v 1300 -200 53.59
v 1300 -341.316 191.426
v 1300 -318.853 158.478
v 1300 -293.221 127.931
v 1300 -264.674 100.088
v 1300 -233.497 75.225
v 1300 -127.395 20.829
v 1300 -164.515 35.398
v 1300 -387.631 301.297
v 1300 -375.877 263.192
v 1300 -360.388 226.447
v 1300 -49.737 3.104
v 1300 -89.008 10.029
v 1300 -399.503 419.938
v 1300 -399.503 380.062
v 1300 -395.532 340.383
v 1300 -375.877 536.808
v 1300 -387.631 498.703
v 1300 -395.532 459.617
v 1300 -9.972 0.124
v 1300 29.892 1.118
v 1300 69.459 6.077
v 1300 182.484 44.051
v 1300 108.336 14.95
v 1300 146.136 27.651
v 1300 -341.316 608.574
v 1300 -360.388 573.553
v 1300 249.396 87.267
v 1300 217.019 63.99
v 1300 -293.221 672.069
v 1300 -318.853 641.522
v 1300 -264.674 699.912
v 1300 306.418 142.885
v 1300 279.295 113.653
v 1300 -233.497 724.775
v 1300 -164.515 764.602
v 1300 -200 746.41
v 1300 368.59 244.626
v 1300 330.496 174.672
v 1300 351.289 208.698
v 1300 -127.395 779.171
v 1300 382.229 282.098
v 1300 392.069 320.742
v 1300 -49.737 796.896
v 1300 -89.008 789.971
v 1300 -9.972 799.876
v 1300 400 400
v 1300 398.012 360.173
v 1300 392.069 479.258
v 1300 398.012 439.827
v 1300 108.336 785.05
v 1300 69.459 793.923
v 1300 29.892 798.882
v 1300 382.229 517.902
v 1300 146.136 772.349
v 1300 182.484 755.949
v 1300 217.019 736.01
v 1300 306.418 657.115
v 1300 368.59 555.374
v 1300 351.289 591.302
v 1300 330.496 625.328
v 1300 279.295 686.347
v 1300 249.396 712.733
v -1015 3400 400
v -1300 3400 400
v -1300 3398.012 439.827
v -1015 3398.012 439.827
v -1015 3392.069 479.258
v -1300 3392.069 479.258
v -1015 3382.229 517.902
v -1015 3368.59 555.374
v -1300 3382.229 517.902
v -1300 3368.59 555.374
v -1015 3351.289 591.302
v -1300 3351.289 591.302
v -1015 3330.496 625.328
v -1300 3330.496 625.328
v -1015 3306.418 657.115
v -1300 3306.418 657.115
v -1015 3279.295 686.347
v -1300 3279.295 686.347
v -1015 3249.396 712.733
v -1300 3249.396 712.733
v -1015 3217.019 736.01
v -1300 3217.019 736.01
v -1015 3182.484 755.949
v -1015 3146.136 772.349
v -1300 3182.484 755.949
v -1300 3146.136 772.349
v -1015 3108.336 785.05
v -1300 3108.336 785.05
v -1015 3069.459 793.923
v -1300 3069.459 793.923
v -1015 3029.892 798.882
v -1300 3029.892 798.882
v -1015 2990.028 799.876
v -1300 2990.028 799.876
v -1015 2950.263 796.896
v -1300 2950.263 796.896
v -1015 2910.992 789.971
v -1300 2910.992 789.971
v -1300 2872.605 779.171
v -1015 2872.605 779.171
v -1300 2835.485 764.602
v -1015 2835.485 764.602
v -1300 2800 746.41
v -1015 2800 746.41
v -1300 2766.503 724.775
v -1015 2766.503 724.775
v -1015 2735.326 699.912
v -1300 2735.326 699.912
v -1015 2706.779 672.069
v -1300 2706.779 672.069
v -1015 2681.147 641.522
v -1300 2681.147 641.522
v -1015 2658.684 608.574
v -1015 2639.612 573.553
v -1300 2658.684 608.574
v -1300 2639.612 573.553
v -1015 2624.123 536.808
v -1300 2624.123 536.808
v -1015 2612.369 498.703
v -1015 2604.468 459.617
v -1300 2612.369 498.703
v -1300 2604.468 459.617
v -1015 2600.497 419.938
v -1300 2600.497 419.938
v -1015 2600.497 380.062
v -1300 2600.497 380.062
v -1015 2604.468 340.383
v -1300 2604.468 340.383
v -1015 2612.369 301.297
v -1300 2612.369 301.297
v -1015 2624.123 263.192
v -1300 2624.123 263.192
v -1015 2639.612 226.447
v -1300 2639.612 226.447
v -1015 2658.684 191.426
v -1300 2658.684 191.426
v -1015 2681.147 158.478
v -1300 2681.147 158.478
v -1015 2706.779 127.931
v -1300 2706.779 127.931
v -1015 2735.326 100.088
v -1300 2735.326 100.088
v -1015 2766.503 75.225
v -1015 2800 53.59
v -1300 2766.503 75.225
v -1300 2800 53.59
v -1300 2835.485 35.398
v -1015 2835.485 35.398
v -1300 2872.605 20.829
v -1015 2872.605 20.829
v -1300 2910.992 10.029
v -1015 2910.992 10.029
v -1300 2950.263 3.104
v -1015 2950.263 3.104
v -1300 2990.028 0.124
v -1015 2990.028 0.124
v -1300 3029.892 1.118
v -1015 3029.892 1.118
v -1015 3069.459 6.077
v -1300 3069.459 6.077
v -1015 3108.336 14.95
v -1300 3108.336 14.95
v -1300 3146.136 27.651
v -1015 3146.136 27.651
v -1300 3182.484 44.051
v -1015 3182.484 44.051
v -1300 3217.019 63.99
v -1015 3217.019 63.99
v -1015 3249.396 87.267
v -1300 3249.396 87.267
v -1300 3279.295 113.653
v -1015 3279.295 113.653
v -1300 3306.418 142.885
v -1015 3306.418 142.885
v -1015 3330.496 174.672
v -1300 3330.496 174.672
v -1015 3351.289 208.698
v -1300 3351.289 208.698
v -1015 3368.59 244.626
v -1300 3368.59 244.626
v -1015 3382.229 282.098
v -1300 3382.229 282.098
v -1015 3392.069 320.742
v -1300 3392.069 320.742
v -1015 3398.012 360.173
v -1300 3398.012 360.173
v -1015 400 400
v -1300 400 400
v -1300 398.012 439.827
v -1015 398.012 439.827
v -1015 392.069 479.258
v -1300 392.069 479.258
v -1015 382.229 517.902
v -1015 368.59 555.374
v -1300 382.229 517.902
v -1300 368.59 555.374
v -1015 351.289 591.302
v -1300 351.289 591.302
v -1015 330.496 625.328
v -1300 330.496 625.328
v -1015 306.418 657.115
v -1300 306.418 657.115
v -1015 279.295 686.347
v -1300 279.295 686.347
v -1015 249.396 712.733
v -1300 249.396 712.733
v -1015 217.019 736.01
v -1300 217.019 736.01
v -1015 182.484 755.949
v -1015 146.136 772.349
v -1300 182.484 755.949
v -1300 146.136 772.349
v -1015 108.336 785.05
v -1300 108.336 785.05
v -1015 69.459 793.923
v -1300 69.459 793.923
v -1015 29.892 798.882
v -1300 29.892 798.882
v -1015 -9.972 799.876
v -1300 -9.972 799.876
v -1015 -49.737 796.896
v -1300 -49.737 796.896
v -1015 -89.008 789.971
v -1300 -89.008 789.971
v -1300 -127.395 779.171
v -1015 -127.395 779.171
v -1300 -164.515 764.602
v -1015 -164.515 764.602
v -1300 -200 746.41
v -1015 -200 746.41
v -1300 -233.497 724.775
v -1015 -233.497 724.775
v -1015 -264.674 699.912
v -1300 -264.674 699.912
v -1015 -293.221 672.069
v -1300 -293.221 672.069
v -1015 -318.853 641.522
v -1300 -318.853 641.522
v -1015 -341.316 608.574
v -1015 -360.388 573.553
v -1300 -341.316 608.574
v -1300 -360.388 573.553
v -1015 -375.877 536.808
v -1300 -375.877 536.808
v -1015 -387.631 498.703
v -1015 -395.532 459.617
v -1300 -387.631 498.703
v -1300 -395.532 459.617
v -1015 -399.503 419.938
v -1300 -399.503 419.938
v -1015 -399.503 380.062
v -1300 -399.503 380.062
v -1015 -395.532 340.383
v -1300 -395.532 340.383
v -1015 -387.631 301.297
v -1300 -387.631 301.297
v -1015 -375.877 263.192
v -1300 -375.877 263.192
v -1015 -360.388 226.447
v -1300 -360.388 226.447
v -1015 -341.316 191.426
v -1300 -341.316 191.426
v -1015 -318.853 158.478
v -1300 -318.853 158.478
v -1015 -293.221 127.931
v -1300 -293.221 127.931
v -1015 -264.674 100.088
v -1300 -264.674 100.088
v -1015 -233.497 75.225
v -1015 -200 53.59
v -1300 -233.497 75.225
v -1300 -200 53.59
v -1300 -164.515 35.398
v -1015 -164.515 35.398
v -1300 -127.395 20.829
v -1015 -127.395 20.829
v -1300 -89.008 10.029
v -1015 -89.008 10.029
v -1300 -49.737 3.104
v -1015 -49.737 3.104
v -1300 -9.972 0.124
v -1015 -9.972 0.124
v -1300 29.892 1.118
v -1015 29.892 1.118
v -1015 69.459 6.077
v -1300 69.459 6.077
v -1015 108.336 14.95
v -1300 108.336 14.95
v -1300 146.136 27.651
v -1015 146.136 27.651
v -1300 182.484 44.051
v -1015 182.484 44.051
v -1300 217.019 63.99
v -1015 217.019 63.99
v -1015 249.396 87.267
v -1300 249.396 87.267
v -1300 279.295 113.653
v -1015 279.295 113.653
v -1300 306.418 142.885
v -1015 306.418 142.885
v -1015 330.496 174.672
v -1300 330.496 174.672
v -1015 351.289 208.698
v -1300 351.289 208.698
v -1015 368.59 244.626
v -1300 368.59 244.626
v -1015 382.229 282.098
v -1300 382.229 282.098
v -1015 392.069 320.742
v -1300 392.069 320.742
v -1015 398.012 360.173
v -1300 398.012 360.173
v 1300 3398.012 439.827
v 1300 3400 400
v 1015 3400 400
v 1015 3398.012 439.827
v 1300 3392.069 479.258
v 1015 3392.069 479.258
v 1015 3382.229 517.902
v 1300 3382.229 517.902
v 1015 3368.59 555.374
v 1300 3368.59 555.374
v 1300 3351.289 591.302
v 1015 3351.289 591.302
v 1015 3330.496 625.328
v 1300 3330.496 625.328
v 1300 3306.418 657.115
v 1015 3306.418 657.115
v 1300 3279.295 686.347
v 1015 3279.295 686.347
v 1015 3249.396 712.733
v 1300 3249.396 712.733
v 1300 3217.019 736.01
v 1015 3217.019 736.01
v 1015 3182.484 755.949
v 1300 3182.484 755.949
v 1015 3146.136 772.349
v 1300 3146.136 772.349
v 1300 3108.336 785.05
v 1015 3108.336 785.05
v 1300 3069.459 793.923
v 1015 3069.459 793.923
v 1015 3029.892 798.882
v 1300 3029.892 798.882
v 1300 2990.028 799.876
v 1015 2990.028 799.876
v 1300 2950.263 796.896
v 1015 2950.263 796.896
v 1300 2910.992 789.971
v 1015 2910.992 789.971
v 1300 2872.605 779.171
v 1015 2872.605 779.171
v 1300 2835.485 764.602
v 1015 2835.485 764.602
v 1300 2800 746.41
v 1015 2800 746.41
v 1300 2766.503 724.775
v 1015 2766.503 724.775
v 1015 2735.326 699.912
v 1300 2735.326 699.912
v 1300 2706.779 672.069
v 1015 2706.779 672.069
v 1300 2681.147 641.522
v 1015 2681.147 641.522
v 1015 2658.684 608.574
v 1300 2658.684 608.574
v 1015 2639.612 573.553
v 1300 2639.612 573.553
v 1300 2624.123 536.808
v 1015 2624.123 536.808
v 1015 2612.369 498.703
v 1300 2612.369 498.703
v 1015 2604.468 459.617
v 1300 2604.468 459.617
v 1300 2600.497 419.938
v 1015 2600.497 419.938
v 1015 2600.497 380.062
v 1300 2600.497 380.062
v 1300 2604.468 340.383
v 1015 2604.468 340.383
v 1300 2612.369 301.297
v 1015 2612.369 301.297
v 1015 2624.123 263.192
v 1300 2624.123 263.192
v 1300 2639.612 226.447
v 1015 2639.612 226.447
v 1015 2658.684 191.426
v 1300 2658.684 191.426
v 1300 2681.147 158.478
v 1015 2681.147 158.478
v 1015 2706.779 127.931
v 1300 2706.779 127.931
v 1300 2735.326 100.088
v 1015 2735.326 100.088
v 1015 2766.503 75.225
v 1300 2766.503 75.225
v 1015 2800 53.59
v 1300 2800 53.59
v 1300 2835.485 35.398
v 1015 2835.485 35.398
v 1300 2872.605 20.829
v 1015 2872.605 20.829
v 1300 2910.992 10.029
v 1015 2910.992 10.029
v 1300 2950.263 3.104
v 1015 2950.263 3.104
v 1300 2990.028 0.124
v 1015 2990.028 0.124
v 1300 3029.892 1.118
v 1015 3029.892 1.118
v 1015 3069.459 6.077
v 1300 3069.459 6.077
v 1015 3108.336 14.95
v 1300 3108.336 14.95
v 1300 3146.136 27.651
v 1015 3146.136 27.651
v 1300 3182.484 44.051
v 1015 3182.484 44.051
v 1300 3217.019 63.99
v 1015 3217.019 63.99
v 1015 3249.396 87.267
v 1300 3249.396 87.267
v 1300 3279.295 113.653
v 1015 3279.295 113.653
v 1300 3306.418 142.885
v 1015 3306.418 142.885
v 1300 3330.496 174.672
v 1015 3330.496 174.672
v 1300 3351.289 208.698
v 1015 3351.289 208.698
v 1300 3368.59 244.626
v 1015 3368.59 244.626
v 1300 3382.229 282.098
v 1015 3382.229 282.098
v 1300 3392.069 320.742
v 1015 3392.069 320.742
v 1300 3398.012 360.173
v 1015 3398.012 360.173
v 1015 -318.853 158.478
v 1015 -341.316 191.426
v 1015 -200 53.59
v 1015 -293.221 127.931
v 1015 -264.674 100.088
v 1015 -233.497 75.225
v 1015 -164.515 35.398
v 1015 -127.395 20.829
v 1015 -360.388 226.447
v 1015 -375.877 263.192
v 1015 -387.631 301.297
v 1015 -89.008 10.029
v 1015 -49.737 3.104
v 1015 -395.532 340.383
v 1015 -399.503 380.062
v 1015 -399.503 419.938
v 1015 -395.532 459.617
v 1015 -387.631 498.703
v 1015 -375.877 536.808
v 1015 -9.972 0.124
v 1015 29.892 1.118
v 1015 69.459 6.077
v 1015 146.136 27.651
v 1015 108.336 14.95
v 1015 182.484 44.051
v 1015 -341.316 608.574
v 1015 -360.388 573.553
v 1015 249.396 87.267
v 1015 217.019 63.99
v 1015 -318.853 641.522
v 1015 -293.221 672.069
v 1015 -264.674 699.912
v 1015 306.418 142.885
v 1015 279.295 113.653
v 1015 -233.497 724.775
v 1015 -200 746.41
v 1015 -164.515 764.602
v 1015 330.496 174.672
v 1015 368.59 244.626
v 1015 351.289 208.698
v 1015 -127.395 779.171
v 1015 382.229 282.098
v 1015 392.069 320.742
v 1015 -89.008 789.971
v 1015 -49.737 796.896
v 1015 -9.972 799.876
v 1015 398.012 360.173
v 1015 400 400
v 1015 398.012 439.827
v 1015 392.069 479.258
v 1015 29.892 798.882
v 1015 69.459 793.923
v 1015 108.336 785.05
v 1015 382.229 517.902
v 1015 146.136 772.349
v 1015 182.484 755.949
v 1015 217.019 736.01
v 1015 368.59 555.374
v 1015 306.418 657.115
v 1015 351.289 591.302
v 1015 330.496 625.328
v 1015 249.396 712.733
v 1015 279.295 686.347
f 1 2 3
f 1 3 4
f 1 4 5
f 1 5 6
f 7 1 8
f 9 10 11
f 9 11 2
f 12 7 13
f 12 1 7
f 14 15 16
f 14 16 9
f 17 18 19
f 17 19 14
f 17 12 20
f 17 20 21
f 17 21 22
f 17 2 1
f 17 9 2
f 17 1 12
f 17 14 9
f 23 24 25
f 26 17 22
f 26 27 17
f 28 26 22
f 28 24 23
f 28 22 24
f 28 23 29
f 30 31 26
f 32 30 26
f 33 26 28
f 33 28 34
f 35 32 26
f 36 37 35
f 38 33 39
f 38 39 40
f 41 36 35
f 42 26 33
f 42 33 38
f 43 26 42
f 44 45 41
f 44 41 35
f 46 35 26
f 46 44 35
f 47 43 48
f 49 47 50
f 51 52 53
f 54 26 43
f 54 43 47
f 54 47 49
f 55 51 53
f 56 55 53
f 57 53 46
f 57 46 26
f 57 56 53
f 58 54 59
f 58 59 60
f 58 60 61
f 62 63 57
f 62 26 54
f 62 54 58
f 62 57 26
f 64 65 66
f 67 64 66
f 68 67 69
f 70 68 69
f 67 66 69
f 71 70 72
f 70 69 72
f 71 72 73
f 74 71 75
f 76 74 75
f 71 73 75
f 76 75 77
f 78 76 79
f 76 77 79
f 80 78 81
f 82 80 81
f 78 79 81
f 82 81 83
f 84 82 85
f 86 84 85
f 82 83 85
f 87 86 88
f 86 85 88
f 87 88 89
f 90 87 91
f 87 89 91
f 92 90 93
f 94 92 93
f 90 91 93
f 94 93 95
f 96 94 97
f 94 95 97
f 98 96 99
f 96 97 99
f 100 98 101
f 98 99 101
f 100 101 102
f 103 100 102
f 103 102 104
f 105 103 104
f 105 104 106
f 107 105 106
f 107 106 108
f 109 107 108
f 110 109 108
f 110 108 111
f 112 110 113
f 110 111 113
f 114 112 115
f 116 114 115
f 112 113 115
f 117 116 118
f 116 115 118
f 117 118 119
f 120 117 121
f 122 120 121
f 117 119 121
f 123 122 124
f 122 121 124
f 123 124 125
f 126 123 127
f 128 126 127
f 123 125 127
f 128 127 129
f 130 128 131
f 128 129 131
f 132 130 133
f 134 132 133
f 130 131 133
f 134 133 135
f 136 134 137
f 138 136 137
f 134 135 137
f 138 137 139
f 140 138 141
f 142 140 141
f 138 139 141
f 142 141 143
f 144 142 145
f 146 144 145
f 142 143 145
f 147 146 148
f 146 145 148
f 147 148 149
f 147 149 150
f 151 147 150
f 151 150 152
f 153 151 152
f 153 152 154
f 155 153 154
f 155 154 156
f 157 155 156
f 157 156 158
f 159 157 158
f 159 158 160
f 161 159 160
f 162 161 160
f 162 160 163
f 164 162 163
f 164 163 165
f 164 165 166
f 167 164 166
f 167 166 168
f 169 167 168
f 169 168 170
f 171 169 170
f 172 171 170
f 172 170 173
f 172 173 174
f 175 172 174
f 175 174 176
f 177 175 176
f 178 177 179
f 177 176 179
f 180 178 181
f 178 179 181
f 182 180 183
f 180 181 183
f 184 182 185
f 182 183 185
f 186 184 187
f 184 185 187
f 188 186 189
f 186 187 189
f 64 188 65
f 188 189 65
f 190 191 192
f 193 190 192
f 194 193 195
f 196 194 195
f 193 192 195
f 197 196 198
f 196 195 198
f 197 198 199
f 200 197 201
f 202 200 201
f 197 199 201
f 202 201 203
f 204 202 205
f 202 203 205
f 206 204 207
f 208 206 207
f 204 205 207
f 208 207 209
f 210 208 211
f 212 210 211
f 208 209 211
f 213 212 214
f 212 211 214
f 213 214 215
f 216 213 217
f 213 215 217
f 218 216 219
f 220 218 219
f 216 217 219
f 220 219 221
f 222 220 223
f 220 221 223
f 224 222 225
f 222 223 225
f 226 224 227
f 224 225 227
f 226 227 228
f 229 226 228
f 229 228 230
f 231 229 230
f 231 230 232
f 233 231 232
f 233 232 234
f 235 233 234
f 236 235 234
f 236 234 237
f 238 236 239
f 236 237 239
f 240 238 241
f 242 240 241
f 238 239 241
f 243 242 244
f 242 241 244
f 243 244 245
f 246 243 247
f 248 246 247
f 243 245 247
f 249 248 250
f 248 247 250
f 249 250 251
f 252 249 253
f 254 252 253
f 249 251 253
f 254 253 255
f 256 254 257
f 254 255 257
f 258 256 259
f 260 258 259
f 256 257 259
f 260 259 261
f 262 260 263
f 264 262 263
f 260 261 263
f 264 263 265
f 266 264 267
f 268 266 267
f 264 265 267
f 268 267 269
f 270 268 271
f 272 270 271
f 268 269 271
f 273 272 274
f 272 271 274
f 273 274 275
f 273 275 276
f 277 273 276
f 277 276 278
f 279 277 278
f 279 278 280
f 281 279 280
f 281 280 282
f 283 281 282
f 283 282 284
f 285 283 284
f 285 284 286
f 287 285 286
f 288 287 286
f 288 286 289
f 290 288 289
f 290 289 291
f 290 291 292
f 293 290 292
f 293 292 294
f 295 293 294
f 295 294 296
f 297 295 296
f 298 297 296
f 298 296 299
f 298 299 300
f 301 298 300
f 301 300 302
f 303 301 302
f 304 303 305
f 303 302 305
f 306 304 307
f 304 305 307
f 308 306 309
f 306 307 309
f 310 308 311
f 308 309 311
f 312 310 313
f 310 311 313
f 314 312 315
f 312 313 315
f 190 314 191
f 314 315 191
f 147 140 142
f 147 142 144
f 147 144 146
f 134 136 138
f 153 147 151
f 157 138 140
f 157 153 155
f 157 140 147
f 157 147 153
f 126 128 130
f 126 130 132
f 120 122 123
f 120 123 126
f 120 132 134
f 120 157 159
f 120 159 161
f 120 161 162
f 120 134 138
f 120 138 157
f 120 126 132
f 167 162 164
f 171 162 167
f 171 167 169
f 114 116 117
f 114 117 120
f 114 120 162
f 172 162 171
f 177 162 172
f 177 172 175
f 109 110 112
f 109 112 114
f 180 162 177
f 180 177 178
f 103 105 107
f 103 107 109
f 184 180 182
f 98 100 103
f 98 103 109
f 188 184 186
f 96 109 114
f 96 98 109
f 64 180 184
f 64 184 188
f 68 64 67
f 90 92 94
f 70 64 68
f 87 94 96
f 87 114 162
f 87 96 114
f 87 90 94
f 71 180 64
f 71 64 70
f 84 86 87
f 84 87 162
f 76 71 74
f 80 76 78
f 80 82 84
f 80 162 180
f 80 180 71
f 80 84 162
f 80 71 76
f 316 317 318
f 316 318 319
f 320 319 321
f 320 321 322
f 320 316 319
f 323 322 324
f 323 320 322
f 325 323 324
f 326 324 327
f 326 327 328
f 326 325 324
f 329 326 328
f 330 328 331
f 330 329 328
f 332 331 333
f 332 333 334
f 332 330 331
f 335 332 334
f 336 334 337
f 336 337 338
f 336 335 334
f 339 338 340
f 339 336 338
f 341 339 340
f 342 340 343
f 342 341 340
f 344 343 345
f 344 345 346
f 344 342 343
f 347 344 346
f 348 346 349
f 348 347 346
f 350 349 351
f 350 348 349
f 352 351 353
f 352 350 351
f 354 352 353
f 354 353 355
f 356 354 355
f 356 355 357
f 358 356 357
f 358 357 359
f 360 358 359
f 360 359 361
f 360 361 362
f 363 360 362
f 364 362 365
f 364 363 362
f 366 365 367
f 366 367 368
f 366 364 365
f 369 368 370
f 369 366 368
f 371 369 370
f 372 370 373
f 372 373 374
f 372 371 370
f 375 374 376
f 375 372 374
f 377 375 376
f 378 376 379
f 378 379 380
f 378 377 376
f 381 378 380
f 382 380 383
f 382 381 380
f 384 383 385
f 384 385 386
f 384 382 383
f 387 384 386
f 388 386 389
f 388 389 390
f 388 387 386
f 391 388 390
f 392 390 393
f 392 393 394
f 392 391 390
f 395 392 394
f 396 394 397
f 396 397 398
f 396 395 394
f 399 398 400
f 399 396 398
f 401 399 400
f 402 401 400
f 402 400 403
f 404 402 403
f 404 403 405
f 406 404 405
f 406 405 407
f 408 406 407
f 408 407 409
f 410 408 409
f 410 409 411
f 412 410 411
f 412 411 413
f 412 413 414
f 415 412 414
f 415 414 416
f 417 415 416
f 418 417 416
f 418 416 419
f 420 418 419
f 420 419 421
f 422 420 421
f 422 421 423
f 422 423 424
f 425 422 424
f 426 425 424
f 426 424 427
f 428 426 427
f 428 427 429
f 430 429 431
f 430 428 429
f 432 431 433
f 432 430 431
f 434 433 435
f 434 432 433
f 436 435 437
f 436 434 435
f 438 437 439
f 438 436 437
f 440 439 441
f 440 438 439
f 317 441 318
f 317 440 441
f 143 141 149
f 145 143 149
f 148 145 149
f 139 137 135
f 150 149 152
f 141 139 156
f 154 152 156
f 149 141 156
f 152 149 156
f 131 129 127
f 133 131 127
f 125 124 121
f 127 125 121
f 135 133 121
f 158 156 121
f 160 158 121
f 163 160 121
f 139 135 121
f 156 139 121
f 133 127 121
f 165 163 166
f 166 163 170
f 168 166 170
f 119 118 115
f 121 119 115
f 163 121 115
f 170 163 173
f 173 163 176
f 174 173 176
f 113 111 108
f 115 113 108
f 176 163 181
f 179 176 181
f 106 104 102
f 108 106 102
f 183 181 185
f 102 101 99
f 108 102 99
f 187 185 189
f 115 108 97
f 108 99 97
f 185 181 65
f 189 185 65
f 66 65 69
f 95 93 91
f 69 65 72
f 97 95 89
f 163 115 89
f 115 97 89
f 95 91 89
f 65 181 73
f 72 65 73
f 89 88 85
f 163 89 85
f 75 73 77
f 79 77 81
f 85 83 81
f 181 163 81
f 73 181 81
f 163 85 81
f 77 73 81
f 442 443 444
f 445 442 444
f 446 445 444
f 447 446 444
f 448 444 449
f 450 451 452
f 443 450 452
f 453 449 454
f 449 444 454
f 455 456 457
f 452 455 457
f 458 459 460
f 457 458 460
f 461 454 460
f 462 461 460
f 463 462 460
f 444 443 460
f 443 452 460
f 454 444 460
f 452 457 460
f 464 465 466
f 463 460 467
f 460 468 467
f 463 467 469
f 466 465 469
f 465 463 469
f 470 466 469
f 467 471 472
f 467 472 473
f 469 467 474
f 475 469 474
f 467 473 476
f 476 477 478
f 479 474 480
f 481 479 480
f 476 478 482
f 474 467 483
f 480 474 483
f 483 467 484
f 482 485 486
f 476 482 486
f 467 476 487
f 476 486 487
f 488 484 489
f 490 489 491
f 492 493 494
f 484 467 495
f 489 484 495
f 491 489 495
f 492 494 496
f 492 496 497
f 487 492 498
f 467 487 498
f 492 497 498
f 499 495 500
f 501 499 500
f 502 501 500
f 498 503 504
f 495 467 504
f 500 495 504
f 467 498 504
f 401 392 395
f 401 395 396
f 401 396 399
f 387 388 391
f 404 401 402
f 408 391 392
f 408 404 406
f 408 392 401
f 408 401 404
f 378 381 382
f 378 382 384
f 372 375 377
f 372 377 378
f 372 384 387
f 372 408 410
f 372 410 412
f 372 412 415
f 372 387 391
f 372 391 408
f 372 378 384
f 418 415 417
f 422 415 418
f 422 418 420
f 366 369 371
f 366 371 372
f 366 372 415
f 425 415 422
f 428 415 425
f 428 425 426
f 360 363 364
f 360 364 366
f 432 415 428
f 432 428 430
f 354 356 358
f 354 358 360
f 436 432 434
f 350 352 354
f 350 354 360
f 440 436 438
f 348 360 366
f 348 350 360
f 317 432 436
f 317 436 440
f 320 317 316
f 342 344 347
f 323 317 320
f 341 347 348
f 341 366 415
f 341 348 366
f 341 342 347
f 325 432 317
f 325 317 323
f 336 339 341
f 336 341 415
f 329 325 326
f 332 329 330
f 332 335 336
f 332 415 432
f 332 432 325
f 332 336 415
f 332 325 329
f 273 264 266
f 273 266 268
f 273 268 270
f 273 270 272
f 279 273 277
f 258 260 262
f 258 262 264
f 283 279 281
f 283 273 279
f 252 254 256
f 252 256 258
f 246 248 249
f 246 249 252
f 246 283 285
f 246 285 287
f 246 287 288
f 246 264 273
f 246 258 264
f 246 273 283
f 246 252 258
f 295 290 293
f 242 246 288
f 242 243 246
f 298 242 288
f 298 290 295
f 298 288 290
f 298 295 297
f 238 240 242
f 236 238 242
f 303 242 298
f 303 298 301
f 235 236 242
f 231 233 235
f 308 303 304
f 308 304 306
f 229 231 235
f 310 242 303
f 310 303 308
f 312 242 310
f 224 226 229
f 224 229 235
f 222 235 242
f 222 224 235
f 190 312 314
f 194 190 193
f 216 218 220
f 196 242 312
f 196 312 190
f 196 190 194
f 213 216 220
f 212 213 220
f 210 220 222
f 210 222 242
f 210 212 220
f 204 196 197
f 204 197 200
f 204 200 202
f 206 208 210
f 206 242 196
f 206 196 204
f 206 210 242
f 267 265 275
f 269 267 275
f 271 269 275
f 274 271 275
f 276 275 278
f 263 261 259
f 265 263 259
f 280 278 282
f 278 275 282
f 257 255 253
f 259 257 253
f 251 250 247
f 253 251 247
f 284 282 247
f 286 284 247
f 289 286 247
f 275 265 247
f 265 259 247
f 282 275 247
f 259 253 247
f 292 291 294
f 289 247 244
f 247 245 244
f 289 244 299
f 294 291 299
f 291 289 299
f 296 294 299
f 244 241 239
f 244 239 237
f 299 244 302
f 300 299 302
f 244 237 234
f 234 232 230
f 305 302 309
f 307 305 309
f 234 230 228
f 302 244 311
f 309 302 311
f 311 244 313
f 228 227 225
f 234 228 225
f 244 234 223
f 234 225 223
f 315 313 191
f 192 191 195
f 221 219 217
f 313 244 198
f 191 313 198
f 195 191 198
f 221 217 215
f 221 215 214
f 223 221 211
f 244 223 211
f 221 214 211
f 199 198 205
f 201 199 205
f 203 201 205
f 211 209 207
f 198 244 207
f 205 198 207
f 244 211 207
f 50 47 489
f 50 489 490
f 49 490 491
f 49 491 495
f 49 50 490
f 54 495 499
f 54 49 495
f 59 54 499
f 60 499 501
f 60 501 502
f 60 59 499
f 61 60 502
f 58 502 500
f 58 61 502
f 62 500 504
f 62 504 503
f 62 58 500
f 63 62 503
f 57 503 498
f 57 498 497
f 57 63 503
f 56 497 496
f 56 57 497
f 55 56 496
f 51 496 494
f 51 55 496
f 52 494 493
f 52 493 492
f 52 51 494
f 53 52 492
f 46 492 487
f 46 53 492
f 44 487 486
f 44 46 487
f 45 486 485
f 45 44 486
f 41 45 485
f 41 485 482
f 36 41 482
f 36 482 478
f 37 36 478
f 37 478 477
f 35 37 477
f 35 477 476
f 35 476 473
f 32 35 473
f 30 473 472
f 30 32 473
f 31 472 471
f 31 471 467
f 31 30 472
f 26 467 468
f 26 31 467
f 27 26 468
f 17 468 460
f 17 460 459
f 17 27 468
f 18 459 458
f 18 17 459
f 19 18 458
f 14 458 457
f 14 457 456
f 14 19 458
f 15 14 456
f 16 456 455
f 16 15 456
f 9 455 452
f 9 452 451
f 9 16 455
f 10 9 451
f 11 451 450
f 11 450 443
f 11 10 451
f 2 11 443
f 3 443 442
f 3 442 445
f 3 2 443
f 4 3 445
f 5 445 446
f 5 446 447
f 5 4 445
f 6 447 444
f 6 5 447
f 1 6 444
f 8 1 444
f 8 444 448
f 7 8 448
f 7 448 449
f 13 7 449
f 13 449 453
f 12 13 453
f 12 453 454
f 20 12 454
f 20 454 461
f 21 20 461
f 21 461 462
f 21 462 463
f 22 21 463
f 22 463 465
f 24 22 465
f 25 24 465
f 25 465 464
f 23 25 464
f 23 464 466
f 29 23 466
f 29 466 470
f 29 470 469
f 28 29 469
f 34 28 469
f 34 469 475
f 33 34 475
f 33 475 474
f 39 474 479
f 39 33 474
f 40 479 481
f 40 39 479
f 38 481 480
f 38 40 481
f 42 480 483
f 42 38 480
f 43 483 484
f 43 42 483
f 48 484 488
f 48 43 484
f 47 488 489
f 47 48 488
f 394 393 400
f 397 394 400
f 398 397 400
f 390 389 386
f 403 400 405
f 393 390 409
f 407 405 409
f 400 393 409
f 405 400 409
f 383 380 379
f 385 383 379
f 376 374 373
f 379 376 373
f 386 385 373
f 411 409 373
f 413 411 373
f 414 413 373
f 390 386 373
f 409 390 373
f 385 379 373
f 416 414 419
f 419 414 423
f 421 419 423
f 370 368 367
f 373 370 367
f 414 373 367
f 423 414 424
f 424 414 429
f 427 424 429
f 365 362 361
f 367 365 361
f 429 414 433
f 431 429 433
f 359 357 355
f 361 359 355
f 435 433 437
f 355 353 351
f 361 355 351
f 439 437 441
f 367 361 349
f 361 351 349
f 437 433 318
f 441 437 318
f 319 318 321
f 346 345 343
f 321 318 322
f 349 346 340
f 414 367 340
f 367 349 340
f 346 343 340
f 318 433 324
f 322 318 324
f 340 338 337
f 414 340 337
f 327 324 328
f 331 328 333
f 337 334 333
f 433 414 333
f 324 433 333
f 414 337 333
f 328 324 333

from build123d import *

# Parameters (mm, degrees)
F2_R     = 400
F3_DEPTH = 285


# Not quite as in the source:
# - a pattern or mirror of a feature is missing from the dataset's text; its kind, count and spacing are read off the source's solid


with BuildPart() as f3:
    # F2 (on offset) → F3 (new body)
    with BuildSketch(Plane.YZ.offset(1300)):
        with Locations((0, 400)):
            Circle(F2_R)
    extrude(amount=-F3_DEPTH)


with BuildPart() as f3b:
    # F2 (on offset) → F3, piece 2 (new body)
    with BuildSketch(Plane.YZ.offset(1300)):
        with Locations((3000, 400)):
            Circle(F2_R)
    extrude(amount=-F3_DEPTH)


with BuildPart() as f3_copies_1:
    # F3_copies: instance of F3
    add(f3.part.mirror(Plane(origin=(0, 0, 0), x_dir=(0, 0, -1), z_dir=(-1, 0, 0))))


with BuildPart() as f3_2_copies_1:
    # F3_2_copies: instance of F3b
    add(f3b.part.mirror(Plane(origin=(0, 0, 0), x_dir=(0, 0, -1), z_dir=(-1, 0, 0))))


solid = Compound([f3.part, f3b.part, f3_copies_1.part, f3_2_copies_1.part])
